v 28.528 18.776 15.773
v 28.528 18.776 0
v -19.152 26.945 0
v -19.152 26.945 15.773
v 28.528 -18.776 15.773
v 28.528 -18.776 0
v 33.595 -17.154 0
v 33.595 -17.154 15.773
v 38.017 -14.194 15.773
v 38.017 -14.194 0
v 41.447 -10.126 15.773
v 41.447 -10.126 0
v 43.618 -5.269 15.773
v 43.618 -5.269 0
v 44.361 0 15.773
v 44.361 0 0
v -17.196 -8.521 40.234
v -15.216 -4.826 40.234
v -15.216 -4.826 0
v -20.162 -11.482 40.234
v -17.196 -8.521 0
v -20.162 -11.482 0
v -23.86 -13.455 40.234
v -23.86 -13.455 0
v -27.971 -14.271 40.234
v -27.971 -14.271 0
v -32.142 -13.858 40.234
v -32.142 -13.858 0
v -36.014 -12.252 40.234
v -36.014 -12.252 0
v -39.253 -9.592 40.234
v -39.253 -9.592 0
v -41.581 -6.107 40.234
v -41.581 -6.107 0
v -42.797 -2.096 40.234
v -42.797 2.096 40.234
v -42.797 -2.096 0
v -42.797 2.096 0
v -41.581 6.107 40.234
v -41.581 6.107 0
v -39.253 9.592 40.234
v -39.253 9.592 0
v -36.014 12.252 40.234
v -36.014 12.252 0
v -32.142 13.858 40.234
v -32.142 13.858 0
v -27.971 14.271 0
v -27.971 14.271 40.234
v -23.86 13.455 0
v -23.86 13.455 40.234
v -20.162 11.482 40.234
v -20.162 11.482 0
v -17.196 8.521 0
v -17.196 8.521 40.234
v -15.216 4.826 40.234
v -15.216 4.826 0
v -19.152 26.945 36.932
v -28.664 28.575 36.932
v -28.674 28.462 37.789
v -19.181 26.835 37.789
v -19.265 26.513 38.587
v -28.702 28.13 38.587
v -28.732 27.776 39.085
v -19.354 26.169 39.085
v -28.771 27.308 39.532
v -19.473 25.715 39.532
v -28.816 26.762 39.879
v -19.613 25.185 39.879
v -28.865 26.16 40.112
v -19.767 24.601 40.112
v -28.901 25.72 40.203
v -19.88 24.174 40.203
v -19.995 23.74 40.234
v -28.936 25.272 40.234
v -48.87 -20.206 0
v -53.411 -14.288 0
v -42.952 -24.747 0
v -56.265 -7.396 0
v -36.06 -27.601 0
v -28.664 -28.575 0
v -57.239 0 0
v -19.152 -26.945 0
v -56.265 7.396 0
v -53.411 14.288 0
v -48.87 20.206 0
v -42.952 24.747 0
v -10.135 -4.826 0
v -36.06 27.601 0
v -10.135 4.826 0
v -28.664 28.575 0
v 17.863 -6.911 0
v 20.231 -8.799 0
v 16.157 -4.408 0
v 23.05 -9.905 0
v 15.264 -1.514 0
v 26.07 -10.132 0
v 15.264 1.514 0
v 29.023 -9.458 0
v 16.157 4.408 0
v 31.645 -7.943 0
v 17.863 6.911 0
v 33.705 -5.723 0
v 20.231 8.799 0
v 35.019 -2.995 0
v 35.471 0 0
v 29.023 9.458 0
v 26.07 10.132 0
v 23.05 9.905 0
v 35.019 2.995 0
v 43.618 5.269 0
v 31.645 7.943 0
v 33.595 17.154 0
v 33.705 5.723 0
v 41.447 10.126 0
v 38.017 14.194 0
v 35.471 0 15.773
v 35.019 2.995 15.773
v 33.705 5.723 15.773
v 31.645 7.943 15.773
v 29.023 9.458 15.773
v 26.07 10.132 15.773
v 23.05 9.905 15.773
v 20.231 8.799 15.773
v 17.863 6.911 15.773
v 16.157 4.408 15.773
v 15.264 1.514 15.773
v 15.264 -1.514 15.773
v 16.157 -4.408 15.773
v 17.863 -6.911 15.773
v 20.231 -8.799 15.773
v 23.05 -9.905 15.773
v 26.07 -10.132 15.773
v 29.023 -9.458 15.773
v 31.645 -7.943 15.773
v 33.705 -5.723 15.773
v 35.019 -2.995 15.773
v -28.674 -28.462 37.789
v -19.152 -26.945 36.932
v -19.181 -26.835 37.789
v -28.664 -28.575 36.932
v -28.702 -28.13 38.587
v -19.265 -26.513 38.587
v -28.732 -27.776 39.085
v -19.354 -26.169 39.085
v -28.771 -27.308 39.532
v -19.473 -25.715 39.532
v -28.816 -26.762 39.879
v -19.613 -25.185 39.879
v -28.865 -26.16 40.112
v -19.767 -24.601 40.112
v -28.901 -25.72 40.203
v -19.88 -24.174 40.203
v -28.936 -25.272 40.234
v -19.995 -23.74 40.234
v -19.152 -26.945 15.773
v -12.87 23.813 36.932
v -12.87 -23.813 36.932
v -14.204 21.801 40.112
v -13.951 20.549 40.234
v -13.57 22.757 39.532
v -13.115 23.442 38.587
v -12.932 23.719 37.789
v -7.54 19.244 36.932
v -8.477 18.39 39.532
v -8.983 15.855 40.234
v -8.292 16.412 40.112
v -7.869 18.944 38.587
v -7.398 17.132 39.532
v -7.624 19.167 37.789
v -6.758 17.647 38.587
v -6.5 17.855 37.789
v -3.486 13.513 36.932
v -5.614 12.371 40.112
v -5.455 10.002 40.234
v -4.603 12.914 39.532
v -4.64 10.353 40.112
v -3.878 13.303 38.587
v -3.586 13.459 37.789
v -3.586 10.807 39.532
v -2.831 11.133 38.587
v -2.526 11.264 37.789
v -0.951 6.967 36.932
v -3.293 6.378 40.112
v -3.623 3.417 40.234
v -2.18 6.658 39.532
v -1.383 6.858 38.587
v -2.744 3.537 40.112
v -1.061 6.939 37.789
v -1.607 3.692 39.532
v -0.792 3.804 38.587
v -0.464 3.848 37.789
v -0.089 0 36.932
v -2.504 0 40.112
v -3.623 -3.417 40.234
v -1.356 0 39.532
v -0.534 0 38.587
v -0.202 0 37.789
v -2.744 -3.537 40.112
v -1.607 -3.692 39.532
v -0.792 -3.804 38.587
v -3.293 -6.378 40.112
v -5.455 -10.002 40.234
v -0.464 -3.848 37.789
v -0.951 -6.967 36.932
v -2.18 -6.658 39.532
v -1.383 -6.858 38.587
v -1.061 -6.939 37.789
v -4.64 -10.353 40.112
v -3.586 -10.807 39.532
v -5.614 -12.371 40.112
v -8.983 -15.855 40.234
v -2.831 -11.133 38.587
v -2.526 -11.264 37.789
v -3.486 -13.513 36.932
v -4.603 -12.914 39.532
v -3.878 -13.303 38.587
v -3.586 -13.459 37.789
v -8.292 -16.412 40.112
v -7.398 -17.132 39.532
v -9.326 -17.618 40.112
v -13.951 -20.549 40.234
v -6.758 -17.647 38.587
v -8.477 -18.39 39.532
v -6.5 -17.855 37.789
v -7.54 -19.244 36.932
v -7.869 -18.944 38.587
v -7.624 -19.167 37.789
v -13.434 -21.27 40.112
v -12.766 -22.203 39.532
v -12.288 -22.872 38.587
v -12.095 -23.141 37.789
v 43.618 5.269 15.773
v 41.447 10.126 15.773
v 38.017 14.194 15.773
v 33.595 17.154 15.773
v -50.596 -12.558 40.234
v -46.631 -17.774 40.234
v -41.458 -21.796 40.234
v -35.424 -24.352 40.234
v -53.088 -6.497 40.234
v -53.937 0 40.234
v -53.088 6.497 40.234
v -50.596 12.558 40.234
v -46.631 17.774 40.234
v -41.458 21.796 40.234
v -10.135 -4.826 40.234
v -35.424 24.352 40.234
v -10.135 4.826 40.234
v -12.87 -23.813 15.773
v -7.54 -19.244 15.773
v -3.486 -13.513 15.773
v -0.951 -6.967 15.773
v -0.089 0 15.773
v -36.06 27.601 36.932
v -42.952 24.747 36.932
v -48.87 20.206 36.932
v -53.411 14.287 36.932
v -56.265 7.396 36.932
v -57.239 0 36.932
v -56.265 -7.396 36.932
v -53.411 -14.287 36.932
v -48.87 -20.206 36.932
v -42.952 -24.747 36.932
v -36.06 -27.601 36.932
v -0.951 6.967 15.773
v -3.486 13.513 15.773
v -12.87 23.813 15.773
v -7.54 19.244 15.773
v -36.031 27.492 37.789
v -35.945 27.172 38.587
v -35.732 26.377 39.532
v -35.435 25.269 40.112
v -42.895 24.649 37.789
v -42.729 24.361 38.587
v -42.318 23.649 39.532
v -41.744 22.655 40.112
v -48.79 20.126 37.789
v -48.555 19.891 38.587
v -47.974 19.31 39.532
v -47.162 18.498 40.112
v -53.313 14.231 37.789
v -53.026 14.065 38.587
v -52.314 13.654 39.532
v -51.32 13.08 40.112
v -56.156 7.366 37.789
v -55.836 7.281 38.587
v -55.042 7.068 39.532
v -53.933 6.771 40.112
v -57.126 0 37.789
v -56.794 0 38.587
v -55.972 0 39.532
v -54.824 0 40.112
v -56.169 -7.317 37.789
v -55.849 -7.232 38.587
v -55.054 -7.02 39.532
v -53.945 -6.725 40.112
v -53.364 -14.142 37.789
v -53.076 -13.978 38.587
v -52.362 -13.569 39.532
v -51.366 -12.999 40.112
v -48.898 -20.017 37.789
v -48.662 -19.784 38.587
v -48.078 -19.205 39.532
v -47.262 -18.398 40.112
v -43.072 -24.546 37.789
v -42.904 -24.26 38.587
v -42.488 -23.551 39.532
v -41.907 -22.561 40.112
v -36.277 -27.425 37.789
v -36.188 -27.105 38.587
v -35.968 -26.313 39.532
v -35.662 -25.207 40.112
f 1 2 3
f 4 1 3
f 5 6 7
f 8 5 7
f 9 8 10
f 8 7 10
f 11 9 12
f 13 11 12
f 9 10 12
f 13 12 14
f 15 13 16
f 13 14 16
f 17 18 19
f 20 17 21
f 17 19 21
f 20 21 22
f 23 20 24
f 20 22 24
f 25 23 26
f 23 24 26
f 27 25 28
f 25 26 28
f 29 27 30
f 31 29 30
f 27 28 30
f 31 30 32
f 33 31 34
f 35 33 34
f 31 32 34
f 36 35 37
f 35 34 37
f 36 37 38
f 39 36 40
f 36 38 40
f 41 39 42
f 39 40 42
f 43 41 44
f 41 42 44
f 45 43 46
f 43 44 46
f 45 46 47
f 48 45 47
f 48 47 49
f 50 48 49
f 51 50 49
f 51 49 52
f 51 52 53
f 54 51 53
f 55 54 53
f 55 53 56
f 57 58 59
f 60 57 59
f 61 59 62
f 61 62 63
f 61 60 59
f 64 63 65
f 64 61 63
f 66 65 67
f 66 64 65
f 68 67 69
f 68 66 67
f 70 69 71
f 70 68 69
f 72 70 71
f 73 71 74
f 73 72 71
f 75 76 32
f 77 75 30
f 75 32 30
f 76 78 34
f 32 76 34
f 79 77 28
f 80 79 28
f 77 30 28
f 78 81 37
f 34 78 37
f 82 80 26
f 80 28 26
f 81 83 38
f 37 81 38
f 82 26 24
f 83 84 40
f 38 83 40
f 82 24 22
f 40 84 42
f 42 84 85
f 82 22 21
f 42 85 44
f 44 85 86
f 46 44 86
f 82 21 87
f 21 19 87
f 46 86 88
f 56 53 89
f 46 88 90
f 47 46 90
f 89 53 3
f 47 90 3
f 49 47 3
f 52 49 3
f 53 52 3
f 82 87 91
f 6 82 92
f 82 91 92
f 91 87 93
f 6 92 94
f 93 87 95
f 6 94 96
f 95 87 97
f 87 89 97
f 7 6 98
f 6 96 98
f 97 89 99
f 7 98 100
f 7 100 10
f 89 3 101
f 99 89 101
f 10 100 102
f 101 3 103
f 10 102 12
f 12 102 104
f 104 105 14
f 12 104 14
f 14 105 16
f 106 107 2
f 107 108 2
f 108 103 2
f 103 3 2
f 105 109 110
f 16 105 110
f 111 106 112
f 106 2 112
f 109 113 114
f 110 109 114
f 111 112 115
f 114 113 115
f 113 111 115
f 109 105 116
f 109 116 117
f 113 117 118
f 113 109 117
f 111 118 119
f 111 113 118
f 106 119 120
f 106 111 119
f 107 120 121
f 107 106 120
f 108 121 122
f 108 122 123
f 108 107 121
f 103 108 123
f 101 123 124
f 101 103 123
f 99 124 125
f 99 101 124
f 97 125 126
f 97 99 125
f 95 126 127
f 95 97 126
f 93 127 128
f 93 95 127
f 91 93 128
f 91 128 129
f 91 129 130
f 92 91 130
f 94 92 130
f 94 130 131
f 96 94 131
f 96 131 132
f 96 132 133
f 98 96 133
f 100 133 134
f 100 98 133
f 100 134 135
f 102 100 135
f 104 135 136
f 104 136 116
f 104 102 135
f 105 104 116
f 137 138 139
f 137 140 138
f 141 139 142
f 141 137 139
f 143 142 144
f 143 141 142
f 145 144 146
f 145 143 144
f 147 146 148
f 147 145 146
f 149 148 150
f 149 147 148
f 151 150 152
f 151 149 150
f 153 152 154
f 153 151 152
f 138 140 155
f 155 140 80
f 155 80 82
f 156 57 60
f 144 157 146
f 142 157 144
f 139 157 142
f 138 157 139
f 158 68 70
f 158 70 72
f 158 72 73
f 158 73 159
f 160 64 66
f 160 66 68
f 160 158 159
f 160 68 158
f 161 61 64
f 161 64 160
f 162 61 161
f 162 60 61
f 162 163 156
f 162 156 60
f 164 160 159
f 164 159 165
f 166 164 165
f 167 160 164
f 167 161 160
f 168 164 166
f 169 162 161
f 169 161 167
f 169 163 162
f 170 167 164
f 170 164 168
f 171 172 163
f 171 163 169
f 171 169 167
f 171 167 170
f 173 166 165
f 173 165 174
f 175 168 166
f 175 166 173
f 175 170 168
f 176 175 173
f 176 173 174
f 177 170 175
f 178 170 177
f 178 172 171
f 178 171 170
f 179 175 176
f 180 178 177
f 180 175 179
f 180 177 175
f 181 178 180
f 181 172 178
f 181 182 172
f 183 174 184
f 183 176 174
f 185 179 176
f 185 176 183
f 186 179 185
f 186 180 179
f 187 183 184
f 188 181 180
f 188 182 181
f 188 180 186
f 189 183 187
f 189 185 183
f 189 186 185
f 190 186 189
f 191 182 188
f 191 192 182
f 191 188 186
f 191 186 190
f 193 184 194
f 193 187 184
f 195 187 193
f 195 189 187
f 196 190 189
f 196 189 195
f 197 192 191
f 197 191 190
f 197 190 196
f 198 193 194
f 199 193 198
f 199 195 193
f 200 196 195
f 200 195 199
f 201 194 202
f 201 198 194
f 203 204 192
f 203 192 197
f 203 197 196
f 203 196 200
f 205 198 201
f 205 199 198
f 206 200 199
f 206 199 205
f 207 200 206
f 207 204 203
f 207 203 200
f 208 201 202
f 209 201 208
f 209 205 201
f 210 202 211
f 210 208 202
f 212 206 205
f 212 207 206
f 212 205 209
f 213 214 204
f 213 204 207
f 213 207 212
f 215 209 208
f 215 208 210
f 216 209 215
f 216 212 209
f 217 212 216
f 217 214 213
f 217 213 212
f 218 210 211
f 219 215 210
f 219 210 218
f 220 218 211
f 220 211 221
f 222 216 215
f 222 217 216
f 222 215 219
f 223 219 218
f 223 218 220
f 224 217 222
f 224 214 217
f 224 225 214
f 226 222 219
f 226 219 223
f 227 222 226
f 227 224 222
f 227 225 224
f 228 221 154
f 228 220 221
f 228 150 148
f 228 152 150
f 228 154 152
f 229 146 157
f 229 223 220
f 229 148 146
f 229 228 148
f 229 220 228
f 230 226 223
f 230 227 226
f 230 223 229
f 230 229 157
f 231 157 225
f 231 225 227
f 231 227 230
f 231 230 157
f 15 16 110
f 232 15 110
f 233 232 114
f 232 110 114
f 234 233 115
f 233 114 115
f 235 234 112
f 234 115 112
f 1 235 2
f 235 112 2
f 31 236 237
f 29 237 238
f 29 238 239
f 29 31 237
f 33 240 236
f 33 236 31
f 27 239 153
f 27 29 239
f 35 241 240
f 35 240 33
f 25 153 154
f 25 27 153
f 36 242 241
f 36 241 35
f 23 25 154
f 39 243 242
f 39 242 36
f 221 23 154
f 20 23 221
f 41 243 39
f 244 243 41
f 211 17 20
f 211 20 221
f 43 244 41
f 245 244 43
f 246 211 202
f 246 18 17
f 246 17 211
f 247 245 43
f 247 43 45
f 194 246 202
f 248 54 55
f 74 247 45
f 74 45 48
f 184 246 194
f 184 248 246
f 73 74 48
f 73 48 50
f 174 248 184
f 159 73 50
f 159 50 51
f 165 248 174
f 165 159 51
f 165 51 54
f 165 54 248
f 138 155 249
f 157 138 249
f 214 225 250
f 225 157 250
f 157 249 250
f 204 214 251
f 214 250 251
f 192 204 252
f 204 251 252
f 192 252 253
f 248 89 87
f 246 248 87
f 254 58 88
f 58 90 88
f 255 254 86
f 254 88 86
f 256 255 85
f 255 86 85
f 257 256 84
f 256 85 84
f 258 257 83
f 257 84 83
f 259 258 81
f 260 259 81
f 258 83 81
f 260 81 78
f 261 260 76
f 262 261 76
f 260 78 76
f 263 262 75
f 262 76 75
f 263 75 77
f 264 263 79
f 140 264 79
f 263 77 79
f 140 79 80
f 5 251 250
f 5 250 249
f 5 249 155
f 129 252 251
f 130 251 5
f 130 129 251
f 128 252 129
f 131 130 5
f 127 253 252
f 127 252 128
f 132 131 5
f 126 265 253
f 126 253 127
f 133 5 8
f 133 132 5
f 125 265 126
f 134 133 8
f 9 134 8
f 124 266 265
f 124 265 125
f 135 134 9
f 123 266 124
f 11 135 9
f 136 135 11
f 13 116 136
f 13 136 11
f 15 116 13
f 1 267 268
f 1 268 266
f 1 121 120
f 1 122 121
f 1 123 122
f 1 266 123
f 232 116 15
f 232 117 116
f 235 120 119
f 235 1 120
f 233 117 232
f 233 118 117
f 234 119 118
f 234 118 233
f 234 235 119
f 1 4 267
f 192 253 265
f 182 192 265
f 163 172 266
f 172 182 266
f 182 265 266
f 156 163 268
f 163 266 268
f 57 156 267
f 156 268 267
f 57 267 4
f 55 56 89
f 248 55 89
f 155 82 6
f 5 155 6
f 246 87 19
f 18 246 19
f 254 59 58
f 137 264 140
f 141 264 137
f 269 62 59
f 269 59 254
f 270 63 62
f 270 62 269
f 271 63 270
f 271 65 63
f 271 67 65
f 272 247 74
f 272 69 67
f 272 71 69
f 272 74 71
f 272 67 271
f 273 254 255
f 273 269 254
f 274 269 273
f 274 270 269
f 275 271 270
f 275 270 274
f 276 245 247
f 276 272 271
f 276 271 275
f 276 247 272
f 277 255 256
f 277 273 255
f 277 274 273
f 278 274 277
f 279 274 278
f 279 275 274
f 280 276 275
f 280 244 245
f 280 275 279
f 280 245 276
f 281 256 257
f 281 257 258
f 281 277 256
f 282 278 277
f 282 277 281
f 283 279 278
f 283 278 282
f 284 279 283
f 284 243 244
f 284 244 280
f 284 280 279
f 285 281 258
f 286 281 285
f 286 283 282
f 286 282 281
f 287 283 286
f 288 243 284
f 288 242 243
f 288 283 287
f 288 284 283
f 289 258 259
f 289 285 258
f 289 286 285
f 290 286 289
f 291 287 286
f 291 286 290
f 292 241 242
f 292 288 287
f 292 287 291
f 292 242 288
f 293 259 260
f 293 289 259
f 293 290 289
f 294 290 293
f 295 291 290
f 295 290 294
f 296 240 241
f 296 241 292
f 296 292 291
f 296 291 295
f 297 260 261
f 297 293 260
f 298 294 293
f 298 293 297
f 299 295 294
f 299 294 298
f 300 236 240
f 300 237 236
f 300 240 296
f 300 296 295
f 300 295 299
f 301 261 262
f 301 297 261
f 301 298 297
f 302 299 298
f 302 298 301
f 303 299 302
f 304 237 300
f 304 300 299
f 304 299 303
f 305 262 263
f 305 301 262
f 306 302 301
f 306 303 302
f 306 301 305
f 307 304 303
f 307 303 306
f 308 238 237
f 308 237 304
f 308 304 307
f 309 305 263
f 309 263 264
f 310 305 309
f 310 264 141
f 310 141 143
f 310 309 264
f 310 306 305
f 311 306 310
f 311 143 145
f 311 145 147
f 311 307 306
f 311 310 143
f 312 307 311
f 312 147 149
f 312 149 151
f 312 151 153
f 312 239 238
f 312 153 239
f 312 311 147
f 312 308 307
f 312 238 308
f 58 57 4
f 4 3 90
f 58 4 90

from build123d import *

# Parameters (mm, degrees)
F1_DEPTH    = 40.2336
F0_R        = 10.16
F2_DEPTH    = 15.7734
F3_T1_DEPTH = 37.7177817865
F3_T3_DEPTH = 37.7177817865
F3_T6_ANGLE = 213.1574660215
F3_T8_ANGLE = 174.2489977384


# Not quite as in the source:
# - a fillet or chamfer that OpenCascade refuses, or shapes differently, is made with other operations: its cross-section is extruded or revolved along the edge and cut away or added


with BuildPart() as f1:
    # F0 (on Top) → F1 (new body)
    with BuildSketch(Plane.XY):
        with BuildLine():
            Line((-19.1519816242, 26.9452959039), (-28.6641661078, 28.575))
            ThreePointArc((-28.6641661078, 28.575), (-57.2391661078, 0), (-28.6641661078, -28.575))
            Line((-28.6641661078, -28.575), (-19.1519816242, -26.9452959039))
            ThreePointArc((-19.1519816242, -26.9452959039), (-5.3367005723, -16.5033322905), (-0.0891661078, 0))
            ThreePointArc((-0.0891661078, 0), (-5.3367005723, 16.5033322905), (-19.1519816242, 26.9452959039))
        make_face()
        with BuildLine():
            ThreePointArc((-15.2164012284, -4.826), (-42.9516661078, 0), (-15.2164012284, 4.826))
            Line((-15.2164012284, 4.826), (-10.1348661078, 4.826))
            Line((-10.1348661078, 4.826), (-10.1348661078, -4.826))
            Line((-10.1348661078, -4.826), (-15.2164012284, -4.826))
        make_face(mode=Mode.SUBTRACT)
    extrude(amount=F1_DEPTH)

    # F0 (on Top) → F2 (join)
    with BuildSketch(Plane.XY):
        with BuildLine():
            Line((28.5277611544, 18.7764181619), (-19.1519816242, 26.9452959039))
            ThreePointArc((-19.1519816242, 26.9452959039), (-5.3367005723, 16.5033322905), (-0.0891661078, 0))
            ThreePointArc((-0.0891661078, 0), (-5.3367005723, -16.5033322905), (-19.1519816242, -26.9452959039))
            Line((-19.1519816242, -26.9452959039), (28.5277611544, -18.7764181619))
            ThreePointArc((28.5277611544, -18.7764181619), (6.2608338922, 0), (28.5277611544, 18.7764181619))
        make_face()
        with BuildLine():
            ThreePointArc((44.3608338922, 0), (39.8742291753, 12.2804730295), (28.5277611544, 18.7764181619))
            ThreePointArc((28.5277611544, 18.7764181619), (6.2608338922, 0), (28.5277611544, -18.7764181619))
            ThreePointArc((28.5277611544, -18.7764181619), (39.8742291753, -12.2804730295), (44.3608338922, 0))
        make_face()
        with Locations((25.3108338922, 0)):
            Circle(F0_R, mode=Mode.SUBTRACT)
    extrude(amount=F2_DEPTH)

    # F3: fillet of radius 3.302 on 4 edges, made by hand

    # F3_s2 → F3_t1 (cut)
    with BuildSketch(Plane(origin=(-46.4348249971, -7.955588396, 0), x_dir=(0, 0, 1), z_dir=(0.9856387487, 0.1688675728, 0))):
        with BuildLine():
            ThreePointArc((36.9316, 23.3241790854), (39.2664665915, 22.3570456768), (40.2336, 20.0221790854))
            Line((40.2336, 20.0221790854), (40.2336, 23.3241790854))
            Line((40.2336, 23.3241790854), (36.9316, 23.3241790854))
        make_face()
    extrude(amount=F3_T1_DEPTH, mode=Mode.SUBTRACT)

    # F3_s4 → F3_t3 (cut)
    with BuildSketch(Plane(origin=(-9.258717755, 1.5862781337, 0), x_dir=(0, 0, 1), z_dir=(-0.9856387487, 0.1688675728, 0))):
        with BuildLine():
            ThreePointArc((36.9316, 23.3241790854), (39.2664665915, 22.3570456768), (40.2336, 20.0221790854))
            Line((40.2336, 20.0221790854), (40.2336, 23.3241790854))
            Line((40.2336, 23.3241790854), (36.9316, 23.3241790854))
        make_face()
    extrude(amount=F3_T3_DEPTH, mode=Mode.SUBTRACT)

    # F3_s5 → F3_t6 (revolve, cut)
    with BuildSketch(Plane(origin=(-26.3304812045, 7.8388166507, 0), x_dir=(0, 0, 1), z_dir=(0.95842855, -0.2853326385, 0))):
        with BuildLine():
            ThreePointArc((36.9316, -20.3961778531), (39.2664665915, -19.4290444446), (40.2336, -17.0941778531))
            Line((40.2336, -17.0941778531), (40.2336, -20.3961778531))
            Line((40.2336, -20.3961778531), (36.9316, -20.3961778531))
        make_face()
    revolve(axis=Axis((-28.6641661078, 0, 40.2336), (0, 0, 1)), revolution_arc=F3_T6_ANGLE, mode=Mode.SUBTRACT)

    # F3_s7 → F3_t8 (revolve, cut)
    with BuildSketch(Plane(origin=(-28.5920293734, 1.4361530661, 0), x_dir=(0, 0, 1), z_dir=(-0.9987408987, 0.0501658971, 0))):
        with BuildLine():
            ThreePointArc((40.2336, 23.835036392), (39.2664665915, 26.1699029835), (36.9316, 27.137036392))
            Line((36.9316, 27.137036392), (40.2336, 27.137036392))
            Line((40.2336, 27.137036392), (40.2336, 23.835036392))
        make_face()
    revolve(axis=Axis((-28.6641661078, 0, 40.2336), (0, 0, -1)), revolution_arc=F3_T8_ANGLE, mode=Mode.SUBTRACT)


solid = f1.part
